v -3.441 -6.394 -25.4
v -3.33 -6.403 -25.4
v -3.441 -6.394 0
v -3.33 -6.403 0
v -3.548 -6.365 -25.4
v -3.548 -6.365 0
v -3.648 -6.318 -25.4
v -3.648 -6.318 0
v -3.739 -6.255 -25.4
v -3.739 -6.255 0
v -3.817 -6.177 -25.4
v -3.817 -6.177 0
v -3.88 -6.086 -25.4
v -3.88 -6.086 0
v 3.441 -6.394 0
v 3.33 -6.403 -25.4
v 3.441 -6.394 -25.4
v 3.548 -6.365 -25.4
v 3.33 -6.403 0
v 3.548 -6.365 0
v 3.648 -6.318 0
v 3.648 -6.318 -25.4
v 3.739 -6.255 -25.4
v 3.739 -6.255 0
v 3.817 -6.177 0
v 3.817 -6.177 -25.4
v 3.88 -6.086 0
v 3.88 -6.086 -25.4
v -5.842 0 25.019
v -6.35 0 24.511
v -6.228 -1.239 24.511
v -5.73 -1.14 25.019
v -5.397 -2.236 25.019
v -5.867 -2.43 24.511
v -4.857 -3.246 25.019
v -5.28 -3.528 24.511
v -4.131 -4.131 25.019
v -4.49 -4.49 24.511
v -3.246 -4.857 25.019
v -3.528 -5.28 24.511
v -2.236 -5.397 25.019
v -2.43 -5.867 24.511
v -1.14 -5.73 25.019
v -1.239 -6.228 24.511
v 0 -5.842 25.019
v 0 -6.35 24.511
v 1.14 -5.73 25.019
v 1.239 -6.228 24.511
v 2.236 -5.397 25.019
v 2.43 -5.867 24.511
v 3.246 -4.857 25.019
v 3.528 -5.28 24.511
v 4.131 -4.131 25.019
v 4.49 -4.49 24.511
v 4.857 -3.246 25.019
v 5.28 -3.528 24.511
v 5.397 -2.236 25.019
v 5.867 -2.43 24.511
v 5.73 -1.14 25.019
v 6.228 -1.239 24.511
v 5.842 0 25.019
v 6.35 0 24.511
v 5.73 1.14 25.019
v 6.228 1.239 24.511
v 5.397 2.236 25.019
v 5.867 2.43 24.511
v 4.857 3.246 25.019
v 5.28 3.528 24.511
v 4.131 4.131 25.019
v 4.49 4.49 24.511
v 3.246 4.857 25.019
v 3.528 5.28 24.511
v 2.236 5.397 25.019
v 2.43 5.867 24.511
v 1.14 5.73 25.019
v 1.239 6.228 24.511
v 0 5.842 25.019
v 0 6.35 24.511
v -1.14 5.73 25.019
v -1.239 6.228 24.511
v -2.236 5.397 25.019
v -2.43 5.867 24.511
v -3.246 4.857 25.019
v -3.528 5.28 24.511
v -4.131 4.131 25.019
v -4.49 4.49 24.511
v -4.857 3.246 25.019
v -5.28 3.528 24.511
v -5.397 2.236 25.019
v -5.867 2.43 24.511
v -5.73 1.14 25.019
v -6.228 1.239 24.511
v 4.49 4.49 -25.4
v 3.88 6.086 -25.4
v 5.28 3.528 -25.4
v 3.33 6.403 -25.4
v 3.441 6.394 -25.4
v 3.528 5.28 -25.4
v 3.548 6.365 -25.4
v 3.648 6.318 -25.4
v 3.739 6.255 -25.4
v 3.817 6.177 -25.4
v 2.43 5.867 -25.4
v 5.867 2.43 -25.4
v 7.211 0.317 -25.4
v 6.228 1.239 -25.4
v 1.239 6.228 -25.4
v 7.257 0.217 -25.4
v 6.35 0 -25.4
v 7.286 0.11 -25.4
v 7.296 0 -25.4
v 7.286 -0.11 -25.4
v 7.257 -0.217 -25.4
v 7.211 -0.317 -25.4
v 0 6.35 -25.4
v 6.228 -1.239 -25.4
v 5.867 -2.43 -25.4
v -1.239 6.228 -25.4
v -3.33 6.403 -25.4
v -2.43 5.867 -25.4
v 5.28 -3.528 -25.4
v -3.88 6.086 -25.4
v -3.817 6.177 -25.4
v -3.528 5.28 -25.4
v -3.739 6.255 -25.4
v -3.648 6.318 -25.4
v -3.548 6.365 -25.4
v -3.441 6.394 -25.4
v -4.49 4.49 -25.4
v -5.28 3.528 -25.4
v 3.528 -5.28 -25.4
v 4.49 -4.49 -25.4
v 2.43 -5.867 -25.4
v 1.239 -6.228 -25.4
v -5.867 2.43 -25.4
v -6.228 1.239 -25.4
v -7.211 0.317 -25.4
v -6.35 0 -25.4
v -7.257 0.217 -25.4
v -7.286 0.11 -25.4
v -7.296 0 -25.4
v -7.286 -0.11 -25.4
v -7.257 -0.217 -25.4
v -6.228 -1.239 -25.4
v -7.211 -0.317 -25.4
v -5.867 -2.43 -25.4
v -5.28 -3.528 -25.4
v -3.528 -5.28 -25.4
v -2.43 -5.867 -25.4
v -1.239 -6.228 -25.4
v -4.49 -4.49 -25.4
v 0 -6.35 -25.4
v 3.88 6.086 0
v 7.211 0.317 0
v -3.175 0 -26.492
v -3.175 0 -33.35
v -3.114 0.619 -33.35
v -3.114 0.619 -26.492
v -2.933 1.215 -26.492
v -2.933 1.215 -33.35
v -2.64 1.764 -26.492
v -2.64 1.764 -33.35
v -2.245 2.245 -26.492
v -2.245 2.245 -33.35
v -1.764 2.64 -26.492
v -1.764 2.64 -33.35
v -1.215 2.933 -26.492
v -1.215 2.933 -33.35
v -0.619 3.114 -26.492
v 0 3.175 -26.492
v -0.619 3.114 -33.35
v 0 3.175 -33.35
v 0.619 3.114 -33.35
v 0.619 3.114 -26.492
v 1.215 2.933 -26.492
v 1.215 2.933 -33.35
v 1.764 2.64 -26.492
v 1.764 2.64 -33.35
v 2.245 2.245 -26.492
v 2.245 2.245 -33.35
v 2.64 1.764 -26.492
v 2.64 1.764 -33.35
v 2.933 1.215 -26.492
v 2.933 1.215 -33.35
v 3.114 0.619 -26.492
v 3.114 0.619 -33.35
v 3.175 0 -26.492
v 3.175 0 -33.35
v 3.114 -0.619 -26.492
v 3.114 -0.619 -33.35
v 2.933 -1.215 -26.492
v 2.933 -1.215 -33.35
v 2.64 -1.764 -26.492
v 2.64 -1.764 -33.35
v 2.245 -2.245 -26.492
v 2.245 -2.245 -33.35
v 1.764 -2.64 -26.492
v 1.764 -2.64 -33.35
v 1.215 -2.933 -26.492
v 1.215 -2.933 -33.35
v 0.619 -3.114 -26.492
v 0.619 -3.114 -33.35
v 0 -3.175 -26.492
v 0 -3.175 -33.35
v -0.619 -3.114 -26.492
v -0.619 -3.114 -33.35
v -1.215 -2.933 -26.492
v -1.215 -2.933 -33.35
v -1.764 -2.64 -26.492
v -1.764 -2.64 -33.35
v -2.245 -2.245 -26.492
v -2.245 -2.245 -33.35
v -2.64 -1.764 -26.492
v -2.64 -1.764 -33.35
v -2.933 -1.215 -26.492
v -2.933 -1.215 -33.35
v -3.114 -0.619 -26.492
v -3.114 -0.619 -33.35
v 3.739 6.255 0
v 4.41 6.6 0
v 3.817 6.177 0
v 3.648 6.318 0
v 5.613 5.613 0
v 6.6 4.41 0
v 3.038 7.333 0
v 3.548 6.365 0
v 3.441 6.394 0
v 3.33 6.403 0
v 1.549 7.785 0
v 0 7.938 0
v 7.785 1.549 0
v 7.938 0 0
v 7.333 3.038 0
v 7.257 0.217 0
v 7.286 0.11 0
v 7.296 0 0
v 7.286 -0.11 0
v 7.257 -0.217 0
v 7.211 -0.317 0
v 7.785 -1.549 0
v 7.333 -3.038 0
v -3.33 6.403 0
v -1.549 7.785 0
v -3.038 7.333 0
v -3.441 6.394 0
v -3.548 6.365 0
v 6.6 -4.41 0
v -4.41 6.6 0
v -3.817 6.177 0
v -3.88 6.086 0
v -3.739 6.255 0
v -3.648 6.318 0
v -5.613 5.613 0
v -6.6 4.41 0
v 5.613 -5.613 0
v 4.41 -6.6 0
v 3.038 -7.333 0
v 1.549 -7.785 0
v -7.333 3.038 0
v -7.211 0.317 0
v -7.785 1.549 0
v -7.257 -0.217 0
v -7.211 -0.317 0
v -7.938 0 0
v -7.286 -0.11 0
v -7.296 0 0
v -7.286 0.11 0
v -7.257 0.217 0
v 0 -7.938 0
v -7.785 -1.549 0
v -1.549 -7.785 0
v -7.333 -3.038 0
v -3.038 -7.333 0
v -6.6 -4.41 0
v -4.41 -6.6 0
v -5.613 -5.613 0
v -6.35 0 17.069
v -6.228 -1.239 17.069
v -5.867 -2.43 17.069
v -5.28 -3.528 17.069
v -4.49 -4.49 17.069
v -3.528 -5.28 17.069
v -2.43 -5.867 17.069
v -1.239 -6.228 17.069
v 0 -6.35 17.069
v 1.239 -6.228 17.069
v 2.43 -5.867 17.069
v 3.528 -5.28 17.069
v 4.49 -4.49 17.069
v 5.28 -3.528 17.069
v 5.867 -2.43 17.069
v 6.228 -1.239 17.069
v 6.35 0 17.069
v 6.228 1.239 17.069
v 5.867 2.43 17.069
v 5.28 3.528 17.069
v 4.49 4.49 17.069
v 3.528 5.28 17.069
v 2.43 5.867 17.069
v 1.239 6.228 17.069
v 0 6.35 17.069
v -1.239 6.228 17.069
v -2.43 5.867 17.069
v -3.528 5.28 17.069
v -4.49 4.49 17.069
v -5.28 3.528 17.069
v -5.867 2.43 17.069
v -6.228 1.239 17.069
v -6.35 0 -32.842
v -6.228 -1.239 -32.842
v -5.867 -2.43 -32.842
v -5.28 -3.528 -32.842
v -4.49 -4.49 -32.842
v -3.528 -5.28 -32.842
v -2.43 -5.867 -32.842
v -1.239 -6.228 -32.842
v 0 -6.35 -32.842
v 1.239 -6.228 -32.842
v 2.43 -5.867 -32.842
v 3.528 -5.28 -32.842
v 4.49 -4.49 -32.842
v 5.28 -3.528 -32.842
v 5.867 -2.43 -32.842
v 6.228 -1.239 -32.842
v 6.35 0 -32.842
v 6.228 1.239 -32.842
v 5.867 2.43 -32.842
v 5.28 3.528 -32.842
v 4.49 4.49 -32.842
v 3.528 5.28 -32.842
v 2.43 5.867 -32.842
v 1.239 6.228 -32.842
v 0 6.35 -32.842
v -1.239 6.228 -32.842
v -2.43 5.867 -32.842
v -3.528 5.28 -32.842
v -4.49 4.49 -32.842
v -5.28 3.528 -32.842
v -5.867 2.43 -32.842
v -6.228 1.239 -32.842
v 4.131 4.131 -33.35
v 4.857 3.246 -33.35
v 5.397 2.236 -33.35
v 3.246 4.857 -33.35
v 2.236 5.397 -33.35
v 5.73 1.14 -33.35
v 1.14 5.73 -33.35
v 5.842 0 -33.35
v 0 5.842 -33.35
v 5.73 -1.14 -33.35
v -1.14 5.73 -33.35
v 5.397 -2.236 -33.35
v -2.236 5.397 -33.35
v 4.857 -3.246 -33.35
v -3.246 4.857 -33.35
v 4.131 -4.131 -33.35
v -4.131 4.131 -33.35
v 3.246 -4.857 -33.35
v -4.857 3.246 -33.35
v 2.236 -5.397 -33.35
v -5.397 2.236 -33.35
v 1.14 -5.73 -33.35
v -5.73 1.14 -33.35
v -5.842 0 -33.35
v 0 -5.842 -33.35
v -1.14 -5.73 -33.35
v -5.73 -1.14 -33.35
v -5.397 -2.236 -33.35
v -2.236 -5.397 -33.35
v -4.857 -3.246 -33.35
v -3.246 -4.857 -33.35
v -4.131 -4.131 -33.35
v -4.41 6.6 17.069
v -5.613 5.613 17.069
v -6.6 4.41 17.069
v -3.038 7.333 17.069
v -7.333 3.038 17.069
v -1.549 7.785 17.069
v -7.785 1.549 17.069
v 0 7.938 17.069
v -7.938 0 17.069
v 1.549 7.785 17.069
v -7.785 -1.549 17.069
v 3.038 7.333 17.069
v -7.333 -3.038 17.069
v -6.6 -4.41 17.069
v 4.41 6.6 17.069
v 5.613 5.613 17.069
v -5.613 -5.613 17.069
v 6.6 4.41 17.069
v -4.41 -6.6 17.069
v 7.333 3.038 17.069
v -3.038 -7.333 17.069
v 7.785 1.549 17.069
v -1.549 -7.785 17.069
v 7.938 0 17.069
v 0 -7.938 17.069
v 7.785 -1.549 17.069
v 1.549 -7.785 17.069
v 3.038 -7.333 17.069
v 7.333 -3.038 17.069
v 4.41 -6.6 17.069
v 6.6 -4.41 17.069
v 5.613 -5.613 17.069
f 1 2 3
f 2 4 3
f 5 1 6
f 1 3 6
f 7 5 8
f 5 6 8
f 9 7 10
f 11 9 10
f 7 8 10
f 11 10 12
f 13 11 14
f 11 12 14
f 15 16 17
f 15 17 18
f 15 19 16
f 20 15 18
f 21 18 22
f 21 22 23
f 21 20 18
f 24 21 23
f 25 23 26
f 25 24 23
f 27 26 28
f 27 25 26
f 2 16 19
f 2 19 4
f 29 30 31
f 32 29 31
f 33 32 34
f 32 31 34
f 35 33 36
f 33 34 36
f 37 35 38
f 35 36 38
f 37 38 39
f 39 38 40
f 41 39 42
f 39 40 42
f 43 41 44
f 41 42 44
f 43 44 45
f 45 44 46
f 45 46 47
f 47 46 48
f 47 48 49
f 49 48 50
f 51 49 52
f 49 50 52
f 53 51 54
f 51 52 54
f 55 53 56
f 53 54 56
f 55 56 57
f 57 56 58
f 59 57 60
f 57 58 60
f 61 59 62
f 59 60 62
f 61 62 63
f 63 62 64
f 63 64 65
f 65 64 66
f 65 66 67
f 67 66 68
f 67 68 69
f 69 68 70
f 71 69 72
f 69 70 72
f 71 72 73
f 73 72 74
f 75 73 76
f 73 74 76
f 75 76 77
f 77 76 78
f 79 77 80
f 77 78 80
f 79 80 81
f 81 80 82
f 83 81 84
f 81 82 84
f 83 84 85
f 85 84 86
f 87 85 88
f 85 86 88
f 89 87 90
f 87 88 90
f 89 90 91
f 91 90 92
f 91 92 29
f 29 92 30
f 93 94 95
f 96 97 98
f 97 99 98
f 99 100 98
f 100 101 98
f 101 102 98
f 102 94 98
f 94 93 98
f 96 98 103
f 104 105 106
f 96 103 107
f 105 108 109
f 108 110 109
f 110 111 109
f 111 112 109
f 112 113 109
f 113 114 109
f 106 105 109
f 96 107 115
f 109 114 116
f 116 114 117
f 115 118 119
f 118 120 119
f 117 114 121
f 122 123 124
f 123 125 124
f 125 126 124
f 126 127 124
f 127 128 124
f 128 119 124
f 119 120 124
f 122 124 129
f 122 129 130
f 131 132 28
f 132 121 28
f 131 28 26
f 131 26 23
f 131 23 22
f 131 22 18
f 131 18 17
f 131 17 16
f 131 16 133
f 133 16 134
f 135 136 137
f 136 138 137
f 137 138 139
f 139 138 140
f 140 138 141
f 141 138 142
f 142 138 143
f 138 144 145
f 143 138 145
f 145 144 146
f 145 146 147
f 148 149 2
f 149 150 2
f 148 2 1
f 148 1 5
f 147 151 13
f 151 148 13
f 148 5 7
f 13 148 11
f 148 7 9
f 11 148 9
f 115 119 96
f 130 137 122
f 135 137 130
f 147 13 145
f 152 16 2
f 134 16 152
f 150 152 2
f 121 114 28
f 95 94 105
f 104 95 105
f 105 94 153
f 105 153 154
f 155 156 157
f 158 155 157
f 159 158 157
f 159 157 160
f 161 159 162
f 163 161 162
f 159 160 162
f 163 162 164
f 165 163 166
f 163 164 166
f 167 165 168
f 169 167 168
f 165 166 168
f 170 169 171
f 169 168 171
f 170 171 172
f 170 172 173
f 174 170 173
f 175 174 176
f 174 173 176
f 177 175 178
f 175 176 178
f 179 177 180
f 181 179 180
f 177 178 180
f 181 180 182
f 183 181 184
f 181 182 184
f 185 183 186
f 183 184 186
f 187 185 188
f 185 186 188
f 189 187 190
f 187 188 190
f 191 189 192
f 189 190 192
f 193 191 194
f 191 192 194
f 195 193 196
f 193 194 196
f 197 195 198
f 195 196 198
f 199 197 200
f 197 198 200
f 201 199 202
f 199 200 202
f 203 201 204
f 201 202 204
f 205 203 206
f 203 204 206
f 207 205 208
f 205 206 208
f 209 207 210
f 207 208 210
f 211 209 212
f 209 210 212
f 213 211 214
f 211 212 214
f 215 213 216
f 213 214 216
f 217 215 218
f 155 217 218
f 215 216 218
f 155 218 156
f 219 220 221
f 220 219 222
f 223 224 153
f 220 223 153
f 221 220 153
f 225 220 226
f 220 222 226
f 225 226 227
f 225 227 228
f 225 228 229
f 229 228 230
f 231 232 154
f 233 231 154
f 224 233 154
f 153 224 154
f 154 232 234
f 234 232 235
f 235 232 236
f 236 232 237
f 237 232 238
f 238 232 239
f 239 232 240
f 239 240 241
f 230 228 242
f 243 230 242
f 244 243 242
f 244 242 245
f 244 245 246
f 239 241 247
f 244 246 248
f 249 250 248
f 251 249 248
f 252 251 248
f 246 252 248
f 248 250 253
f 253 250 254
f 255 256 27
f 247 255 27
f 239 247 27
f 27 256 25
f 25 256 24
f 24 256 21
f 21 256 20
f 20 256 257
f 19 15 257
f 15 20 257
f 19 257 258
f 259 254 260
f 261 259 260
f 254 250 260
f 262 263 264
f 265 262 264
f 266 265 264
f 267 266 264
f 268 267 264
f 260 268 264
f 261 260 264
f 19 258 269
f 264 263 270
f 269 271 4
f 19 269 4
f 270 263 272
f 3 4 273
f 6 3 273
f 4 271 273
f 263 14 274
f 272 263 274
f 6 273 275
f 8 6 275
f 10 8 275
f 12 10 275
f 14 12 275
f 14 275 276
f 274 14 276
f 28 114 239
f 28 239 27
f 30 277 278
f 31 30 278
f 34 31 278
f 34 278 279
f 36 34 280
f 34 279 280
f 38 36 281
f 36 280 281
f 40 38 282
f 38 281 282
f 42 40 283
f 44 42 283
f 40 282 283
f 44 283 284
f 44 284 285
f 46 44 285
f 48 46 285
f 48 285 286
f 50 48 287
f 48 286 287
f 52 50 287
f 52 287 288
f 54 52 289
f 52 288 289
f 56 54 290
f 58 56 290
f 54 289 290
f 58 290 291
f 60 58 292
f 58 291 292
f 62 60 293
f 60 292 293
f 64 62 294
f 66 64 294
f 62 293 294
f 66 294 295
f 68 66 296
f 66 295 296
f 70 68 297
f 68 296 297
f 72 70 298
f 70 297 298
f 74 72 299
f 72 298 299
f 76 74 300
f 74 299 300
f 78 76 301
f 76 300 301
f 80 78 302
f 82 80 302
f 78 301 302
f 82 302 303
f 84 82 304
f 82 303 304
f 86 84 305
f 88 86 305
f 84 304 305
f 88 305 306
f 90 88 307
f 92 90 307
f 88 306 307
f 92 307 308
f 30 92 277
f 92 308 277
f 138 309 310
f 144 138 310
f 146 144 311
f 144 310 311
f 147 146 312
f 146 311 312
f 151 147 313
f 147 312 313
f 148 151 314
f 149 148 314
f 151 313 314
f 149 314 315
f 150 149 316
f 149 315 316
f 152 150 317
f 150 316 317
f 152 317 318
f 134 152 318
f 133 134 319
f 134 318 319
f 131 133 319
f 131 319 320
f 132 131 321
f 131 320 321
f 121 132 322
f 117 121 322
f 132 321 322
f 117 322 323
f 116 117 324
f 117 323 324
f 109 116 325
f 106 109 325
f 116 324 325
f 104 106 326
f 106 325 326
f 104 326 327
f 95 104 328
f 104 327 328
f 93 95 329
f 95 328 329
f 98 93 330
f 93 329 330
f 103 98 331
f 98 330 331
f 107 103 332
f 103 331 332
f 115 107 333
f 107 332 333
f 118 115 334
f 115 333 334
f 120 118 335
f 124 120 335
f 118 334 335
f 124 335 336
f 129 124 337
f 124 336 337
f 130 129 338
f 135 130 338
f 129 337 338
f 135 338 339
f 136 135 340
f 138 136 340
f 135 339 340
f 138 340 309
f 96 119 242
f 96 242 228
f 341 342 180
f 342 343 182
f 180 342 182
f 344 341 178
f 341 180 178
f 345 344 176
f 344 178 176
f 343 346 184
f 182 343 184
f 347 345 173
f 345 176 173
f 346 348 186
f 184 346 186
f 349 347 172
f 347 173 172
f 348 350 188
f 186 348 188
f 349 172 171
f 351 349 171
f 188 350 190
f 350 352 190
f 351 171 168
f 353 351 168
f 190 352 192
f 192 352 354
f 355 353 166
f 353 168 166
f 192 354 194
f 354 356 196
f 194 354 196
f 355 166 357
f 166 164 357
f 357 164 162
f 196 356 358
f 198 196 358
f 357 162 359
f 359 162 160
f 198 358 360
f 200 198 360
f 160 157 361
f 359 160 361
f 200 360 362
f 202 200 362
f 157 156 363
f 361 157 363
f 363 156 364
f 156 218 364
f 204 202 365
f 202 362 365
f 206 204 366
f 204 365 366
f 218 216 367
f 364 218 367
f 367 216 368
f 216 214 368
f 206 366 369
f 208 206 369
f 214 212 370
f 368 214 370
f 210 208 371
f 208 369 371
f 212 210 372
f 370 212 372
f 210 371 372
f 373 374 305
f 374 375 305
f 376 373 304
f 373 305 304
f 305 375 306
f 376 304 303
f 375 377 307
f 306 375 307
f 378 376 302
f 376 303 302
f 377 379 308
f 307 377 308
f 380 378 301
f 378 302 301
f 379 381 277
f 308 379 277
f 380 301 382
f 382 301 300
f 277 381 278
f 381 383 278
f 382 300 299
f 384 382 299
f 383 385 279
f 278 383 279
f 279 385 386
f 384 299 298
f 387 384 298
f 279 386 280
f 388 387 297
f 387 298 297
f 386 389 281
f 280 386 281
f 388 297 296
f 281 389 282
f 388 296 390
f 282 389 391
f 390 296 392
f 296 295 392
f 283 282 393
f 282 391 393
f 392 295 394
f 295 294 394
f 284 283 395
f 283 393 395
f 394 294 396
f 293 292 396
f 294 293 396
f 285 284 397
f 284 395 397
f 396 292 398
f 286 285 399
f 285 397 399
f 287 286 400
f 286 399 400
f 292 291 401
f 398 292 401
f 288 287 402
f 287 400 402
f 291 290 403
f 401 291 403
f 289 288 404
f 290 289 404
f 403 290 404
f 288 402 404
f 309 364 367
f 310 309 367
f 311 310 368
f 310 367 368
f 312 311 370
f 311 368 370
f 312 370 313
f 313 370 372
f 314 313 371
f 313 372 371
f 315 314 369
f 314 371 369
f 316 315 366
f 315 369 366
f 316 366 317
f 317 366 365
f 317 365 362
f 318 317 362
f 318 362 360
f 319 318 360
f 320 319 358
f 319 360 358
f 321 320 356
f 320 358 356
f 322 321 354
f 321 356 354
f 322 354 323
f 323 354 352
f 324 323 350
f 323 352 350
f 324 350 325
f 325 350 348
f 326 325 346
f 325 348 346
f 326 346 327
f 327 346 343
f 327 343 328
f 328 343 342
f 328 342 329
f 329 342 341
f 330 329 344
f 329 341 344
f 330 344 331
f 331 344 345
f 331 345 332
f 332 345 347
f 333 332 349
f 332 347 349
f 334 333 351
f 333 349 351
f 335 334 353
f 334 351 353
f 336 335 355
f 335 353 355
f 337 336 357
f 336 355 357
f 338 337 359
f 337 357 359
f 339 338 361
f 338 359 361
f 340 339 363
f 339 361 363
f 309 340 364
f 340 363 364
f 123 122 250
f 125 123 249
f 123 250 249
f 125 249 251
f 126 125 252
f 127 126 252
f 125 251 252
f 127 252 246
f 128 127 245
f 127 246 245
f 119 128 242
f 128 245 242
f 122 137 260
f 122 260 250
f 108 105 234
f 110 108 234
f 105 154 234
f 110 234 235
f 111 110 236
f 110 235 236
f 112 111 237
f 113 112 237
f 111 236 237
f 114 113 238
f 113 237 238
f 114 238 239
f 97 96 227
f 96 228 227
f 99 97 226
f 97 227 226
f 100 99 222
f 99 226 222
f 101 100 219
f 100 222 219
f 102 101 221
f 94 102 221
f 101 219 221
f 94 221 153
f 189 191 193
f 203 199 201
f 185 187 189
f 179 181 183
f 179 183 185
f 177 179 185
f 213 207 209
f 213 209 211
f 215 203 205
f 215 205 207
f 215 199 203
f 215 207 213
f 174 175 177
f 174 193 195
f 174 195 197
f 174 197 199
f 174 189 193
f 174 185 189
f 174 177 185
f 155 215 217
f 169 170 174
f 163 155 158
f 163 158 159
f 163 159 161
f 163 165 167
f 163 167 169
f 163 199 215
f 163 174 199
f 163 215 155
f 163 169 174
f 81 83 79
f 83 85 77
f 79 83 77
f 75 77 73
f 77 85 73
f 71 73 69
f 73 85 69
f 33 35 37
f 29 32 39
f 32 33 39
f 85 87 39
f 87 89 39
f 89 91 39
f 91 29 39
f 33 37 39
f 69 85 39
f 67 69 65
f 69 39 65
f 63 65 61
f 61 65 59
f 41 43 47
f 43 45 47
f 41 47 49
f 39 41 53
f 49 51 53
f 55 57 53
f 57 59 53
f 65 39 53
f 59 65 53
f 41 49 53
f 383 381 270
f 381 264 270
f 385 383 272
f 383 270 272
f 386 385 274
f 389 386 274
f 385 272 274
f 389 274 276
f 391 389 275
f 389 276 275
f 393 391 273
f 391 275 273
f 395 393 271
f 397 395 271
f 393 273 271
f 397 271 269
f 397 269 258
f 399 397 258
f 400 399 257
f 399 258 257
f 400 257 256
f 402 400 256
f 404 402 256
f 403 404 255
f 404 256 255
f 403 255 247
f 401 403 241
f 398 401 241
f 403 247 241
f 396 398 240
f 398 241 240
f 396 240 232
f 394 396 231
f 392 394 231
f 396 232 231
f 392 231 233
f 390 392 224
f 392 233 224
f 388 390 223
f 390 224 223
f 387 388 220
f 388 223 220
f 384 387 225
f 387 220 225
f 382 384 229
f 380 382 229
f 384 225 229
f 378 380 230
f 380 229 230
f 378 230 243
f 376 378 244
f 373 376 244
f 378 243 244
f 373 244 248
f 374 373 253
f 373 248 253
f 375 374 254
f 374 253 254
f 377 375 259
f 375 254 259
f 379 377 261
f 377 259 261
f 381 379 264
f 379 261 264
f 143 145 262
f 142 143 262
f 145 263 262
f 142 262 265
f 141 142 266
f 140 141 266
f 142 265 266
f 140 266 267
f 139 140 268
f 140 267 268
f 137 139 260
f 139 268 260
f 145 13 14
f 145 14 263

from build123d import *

# Parameters (mm, degrees)
SKETCH2_OUTSIDE_W  = 30.382
SKETCH2_OUTSIDE_H  = 30.382
CUT_EXTRUDE1_DEPTH = 25.4
CHAMFER1_SIZE      = 0.508
SKETCH3_R          = 3.175
CUT_EXTRUDE2_DEPTH = 6.858
FILLET1_R          = 0.635


with BuildPart() as part:
    # Sketch1 → Revolve1 (revolve)
    with BuildSketch(Plane(origin=(0, 0, 0), x_dir=(0, 0, -1), z_dir=(1, 0, 0)), mode=Mode.PRIVATE) as revolve1_sk:
        Polygon((-25.019, 0), (-25.019, 6.35), (-17.0688, 6.35), (-17.0688, 7.9375), (0, 7.9375), (0, 7.62), (25.4, 7.62), (25.4, 6.35), (33.3502, 6.35), (33.3502, 0), align=None)
    revolve(revolve1_sk.sketch.rotate(Axis((0, 0, 0), (0, 0, 1)), 90), axis=Axis((0, 0, 0), (0, 0, 1)))

    # Sketch2 outside → Cut-Extrude1 (cut)
    with BuildSketch(Plane(origin=(0, 0, -25.4), x_dir=(-1, 0, 0), z_dir=(0, 0, -1))):
        Rectangle(SKETCH2_OUTSIDE_W, SKETCH2_OUTSIDE_H)
        Polygon((3.696970073, 6.40334), (-3.696970073, 6.40334), (-7.393940145, 0), (-3.696970073, -6.40334), (3.696970073, -6.40334), (7.393940145, 0), align=None, mode=Mode.SUBTRACT)
    extrude(amount=-CUT_EXTRUDE1_DEPTH, mode=Mode.SUBTRACT)

    # Chamfer1
    chamfer1_edges = [part.edges().sort_by_distance(p)[0] for p in [
        (6.35, 0, 25.019),
        (6.35, 0, -33.3502),
    ]]
    chamfer(chamfer1_edges, length=CHAMFER1_SIZE)

    # Sketch3 → Cut-Extrude2 (cut)
    with BuildSketch(Plane(origin=(0, 0, -33.3502), x_dir=(-1, 0, 0), z_dir=(0, 0, -1))):
        Circle(SKETCH3_R)
    extrude(amount=-CUT_EXTRUDE2_DEPTH, mode=Mode.SUBTRACT)

    # Fillet1
    fillet1_edges = [part.edges().sort_by_distance(p)[0] for p in [
        (-3.696970073, 6.40334, -12.7),
        (3.696970073, 6.40334, -12.7),
        (7.393940145, 0, -12.7),
        (3.696970073, -6.40334, -12.7),
        (-3.696970073, -6.40334, -12.7),
        (-7.393940145, 0, -12.7),
    ]]
    fillet(fillet1_edges, radius=FILLET1_R)


solid = part.part
